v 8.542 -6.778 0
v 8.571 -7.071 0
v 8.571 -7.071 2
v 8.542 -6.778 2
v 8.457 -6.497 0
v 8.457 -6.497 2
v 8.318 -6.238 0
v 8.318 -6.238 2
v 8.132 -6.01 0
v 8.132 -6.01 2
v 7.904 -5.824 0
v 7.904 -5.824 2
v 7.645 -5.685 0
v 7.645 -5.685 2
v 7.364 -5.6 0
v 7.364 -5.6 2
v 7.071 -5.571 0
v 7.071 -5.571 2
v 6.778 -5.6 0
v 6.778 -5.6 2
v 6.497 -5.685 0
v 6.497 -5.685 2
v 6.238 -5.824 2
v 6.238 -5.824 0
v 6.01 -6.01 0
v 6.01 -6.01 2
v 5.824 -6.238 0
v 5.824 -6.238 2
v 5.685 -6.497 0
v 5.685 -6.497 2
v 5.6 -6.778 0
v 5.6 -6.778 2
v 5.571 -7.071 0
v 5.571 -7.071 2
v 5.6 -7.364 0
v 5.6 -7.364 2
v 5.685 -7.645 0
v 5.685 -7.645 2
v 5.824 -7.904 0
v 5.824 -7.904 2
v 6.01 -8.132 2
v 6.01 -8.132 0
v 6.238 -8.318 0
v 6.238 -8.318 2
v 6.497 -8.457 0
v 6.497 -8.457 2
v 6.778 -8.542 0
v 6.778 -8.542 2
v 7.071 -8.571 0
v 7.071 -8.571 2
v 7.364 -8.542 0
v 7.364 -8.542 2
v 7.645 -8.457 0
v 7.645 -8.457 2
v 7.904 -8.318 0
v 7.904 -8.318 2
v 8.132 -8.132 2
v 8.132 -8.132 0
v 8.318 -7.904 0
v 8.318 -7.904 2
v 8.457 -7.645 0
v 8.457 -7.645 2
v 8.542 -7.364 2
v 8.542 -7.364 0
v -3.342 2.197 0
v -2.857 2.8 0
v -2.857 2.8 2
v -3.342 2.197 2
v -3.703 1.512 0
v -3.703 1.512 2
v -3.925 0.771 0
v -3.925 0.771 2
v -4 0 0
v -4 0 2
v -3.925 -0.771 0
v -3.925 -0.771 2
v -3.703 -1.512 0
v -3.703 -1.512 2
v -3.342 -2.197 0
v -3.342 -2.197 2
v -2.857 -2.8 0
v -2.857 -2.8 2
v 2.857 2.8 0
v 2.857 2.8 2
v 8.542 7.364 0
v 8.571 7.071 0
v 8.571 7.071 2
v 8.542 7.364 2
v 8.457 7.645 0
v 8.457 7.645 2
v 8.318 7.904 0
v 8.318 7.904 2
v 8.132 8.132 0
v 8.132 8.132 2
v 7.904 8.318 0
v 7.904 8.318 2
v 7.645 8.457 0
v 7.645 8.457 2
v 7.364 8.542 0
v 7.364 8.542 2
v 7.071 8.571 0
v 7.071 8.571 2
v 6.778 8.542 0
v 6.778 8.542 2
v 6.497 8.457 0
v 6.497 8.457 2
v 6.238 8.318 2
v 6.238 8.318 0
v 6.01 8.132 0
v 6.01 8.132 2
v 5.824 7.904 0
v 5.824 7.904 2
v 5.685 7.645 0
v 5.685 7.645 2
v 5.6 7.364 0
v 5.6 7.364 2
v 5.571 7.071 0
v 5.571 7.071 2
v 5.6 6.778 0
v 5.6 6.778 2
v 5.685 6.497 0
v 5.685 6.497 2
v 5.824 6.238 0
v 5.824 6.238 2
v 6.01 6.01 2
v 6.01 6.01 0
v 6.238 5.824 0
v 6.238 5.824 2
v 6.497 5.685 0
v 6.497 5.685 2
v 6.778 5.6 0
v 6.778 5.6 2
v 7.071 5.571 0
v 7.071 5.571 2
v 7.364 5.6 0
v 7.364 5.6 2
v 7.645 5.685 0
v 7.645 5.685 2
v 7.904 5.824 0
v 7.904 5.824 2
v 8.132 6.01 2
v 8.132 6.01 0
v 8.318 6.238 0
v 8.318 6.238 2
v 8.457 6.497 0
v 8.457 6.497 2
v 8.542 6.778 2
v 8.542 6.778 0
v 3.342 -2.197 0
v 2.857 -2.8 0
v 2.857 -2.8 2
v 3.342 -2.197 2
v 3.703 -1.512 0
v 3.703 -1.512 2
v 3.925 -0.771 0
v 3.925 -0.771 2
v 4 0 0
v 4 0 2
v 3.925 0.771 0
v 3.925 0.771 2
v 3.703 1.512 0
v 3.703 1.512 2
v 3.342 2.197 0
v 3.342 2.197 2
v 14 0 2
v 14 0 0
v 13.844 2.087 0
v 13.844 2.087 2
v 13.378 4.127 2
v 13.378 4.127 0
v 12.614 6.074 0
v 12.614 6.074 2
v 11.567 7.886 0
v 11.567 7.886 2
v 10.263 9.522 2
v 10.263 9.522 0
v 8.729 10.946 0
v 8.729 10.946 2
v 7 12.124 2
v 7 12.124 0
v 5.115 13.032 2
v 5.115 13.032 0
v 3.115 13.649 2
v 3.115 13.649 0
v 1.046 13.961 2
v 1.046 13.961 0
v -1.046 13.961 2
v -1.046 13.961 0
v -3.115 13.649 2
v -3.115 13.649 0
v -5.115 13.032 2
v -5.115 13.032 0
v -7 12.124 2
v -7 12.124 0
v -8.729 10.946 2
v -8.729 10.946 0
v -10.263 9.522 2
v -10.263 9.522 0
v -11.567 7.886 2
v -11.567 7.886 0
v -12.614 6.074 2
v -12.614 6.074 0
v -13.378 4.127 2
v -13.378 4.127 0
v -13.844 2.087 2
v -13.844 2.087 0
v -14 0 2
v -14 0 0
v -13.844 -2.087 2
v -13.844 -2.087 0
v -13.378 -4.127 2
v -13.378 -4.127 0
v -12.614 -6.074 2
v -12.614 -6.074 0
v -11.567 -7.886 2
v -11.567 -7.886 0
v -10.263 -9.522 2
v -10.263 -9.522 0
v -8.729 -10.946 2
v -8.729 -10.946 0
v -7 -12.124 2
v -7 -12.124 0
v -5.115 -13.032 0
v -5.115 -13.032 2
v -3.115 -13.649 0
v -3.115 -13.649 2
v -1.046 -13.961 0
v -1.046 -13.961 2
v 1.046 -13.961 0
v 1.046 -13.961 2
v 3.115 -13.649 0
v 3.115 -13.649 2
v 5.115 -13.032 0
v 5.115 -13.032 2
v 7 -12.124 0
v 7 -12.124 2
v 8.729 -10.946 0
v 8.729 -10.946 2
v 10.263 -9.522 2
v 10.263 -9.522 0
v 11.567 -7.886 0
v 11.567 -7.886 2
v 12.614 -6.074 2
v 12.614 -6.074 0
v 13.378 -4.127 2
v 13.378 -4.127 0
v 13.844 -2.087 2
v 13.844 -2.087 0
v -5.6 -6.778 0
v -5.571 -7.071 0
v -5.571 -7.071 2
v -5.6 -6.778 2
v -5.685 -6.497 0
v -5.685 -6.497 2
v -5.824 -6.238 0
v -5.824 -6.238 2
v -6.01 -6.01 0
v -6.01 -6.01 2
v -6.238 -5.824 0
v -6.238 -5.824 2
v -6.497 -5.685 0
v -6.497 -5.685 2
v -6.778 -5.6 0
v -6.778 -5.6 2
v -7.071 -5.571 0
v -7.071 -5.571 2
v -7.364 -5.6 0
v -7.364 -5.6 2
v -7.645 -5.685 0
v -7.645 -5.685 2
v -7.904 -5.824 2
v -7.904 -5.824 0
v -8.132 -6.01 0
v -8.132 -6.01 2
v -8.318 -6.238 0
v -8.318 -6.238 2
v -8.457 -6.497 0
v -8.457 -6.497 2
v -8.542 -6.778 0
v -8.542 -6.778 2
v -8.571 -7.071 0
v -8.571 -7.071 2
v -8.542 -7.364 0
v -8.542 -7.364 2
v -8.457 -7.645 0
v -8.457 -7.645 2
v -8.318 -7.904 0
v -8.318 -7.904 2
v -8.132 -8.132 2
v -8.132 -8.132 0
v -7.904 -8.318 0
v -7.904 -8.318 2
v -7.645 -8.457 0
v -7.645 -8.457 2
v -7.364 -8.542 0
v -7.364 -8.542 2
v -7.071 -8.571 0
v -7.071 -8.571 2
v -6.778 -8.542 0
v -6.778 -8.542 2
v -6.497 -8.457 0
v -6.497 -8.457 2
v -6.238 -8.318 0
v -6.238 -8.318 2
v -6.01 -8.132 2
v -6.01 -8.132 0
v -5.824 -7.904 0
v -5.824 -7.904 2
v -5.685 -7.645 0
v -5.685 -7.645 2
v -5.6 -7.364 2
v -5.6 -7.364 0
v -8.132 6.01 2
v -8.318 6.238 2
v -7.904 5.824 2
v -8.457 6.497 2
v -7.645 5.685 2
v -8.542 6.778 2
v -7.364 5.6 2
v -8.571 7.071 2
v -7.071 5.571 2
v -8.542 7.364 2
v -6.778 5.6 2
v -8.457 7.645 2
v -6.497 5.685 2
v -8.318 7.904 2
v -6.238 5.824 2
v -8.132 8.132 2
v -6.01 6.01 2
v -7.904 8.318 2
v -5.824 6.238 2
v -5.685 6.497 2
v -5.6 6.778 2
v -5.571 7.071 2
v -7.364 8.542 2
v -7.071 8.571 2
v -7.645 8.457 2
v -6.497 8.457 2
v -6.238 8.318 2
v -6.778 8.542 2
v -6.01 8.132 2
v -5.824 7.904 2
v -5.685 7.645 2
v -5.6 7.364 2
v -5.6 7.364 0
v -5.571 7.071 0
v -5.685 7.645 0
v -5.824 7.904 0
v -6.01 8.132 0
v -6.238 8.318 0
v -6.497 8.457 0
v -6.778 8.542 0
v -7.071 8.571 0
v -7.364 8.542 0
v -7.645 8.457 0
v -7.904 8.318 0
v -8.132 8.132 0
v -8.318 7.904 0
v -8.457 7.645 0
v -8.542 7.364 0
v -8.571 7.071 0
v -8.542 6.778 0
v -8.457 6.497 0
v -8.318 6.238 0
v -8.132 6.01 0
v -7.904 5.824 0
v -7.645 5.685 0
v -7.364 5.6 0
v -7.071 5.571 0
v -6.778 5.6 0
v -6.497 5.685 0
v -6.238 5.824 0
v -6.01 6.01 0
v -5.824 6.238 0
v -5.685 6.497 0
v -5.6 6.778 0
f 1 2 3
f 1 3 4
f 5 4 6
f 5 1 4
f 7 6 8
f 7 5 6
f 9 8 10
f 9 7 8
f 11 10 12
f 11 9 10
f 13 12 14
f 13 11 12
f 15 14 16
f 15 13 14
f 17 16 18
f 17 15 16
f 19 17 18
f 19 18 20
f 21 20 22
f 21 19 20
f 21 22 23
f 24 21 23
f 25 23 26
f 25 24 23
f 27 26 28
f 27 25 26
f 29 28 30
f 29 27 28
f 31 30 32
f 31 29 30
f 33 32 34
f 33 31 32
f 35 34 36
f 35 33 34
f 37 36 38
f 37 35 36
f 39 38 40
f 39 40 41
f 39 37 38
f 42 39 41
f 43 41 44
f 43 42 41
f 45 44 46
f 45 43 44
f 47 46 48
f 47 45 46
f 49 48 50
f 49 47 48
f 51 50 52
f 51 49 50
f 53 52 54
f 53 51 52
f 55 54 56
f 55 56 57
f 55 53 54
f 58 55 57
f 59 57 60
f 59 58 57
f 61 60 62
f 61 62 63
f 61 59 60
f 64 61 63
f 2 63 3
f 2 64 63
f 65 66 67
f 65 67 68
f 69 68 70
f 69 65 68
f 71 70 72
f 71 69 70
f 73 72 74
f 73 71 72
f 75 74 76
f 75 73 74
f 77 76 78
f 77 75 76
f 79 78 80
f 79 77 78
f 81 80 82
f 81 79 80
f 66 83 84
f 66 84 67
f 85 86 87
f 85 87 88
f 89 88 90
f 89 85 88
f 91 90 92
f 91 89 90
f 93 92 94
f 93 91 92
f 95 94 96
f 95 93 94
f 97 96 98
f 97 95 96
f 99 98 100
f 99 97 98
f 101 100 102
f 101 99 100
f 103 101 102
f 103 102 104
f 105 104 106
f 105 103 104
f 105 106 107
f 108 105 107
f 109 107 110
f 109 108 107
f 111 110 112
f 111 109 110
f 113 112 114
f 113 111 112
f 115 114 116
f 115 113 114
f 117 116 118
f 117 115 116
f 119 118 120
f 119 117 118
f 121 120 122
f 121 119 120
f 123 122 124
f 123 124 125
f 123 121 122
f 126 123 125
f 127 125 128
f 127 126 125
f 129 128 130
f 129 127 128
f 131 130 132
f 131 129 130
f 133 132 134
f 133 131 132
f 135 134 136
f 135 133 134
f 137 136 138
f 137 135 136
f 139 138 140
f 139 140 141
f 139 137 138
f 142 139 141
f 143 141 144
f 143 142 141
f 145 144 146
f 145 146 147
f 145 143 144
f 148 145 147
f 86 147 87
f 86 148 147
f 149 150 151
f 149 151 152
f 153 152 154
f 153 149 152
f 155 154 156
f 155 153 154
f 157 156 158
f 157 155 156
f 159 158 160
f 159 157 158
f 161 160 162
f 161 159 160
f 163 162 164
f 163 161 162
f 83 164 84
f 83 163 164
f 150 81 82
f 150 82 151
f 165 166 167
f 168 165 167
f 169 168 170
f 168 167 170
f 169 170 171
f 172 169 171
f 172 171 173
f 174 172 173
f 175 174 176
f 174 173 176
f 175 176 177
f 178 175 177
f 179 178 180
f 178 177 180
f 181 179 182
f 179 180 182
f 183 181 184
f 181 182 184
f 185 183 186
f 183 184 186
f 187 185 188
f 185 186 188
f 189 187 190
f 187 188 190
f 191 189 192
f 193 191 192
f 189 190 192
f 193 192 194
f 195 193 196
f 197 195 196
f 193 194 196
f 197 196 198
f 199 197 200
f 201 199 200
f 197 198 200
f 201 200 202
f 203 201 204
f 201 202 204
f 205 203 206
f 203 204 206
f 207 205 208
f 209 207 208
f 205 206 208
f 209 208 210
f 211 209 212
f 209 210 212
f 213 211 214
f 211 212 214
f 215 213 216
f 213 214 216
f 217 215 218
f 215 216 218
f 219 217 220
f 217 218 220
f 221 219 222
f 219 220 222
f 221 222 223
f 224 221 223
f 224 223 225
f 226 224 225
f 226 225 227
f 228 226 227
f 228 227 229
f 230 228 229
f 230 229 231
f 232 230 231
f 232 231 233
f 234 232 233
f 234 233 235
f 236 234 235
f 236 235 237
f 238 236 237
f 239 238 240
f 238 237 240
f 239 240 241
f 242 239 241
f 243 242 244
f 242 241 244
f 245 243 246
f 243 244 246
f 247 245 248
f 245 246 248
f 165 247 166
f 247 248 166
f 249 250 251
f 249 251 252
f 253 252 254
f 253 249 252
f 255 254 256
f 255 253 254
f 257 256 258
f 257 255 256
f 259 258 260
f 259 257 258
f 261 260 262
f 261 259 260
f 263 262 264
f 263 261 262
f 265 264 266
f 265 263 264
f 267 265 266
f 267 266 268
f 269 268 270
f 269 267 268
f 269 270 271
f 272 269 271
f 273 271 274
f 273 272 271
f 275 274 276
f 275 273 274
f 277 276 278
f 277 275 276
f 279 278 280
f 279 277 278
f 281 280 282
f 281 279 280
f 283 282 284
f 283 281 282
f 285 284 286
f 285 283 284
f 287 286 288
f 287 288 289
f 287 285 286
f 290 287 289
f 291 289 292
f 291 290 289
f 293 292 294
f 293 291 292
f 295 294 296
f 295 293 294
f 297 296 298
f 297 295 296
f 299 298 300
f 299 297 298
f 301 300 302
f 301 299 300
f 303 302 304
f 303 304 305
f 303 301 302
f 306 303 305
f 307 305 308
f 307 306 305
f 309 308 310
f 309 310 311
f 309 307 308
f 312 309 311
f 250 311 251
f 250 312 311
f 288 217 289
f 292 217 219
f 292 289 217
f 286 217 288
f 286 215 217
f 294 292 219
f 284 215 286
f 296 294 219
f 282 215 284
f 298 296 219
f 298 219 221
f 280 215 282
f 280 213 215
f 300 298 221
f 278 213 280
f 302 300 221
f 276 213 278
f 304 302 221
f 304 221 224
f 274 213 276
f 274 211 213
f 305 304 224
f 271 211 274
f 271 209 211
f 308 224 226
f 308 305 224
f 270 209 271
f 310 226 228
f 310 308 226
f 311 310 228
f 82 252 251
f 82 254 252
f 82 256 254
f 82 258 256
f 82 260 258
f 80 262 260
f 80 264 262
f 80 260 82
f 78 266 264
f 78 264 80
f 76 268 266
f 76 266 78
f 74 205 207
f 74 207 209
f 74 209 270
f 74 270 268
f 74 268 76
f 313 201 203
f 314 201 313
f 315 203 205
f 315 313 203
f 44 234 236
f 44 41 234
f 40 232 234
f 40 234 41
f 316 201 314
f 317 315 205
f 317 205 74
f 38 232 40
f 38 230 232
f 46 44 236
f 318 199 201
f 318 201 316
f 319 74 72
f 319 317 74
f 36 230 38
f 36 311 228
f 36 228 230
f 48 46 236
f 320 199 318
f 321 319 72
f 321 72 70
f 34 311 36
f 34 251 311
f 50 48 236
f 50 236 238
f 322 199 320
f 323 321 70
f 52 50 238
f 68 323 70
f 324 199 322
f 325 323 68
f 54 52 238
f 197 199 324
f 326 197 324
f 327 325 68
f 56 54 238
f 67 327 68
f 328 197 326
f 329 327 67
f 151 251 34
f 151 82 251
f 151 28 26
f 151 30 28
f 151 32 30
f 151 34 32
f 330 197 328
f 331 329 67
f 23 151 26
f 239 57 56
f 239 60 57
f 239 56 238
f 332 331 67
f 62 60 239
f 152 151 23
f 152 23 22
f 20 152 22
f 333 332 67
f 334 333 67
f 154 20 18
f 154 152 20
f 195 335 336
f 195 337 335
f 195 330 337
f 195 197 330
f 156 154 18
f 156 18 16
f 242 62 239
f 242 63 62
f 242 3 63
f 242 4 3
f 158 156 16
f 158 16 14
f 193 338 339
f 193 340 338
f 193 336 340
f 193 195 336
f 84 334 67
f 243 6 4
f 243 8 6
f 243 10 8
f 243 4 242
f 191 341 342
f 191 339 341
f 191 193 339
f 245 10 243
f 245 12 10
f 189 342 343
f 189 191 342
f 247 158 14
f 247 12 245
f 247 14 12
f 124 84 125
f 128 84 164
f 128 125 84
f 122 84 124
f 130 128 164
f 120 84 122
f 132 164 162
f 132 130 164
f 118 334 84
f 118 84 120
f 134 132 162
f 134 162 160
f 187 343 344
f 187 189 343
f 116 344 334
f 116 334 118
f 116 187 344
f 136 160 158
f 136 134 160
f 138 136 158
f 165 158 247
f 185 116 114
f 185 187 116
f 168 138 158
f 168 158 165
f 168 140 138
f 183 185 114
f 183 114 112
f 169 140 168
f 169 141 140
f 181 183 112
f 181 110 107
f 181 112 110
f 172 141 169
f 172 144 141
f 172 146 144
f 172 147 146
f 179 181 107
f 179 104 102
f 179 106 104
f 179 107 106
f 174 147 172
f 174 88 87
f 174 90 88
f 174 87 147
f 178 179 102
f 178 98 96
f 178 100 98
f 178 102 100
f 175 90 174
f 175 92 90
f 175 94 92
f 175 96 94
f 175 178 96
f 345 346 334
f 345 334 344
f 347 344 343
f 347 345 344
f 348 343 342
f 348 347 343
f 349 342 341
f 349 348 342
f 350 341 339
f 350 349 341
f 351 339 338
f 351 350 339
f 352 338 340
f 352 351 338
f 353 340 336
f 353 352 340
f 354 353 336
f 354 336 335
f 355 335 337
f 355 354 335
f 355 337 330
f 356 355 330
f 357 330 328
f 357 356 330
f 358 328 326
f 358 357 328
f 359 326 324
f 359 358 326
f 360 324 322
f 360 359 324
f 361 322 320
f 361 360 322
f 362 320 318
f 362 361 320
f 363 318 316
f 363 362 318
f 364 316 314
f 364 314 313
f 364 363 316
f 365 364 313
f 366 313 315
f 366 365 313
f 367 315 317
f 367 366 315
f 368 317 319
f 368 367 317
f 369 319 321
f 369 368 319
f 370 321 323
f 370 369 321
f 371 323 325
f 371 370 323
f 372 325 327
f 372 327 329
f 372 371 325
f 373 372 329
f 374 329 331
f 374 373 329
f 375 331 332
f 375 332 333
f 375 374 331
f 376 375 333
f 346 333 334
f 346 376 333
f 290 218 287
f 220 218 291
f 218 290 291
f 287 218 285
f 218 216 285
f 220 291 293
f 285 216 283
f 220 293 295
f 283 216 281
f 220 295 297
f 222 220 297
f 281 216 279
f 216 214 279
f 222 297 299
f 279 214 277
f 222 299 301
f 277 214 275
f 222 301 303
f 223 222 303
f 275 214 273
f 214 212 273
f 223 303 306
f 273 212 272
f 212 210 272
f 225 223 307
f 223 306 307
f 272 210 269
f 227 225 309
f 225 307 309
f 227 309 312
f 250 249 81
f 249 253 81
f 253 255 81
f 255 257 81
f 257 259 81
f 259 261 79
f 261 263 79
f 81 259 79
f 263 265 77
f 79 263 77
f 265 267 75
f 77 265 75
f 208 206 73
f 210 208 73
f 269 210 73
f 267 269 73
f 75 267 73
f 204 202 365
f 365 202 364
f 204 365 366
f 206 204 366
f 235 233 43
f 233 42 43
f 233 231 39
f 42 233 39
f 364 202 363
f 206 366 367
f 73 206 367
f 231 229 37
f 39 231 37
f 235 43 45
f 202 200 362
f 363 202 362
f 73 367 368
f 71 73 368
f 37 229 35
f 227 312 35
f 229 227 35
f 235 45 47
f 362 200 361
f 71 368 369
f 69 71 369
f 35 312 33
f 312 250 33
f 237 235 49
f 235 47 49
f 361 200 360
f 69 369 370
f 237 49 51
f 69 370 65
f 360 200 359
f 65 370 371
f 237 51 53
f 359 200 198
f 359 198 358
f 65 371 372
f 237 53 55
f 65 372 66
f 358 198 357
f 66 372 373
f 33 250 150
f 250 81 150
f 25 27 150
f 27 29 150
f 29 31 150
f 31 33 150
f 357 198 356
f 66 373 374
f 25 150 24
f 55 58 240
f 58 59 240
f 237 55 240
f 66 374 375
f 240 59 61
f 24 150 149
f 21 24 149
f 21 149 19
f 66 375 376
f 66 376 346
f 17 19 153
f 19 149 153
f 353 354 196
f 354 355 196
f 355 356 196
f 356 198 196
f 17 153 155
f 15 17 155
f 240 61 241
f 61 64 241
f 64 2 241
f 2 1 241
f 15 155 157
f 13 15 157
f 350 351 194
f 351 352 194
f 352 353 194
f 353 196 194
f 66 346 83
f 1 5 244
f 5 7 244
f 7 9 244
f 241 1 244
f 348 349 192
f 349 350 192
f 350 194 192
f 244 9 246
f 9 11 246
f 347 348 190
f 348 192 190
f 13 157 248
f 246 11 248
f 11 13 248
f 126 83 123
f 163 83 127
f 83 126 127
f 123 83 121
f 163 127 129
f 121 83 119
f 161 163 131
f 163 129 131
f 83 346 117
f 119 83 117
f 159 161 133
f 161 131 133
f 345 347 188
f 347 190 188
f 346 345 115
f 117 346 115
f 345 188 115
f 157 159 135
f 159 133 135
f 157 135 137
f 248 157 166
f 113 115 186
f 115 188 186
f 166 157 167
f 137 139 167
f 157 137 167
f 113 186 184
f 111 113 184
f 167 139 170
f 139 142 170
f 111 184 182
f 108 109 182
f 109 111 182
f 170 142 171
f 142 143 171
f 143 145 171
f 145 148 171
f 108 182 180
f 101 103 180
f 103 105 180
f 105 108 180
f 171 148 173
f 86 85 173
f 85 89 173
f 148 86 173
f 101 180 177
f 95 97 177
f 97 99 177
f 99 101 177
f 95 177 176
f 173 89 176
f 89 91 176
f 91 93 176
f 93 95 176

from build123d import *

# Parameters (mm, degrees)
SKETCH_1_R          = 14
SKETCH_1_R_2        = 1.5
EXTRUDE_1_DEPTH     = 2
CUT_EXTRUDE_1_DEPTH = 20.899748742


with BuildPart() as part:
    # 草图1 → 凸台-拉伸1 (new body)
    with BuildSketch(Plane.XY):
        Circle(SKETCH_1_R)
        with Locations((-7.071067812, 7.071067812)):
            Circle(SKETCH_1_R_2, mode=Mode.SUBTRACT)
        with Locations((7.071067812, 7.071067812)):
            Circle(SKETCH_1_R_2, mode=Mode.SUBTRACT)
        with Locations((-7.071067812, -7.071067812)):
            Circle(SKETCH_1_R_2, mode=Mode.SUBTRACT)
        with Locations((7.071067812, -7.071067812)):
            Circle(SKETCH_1_R_2, mode=Mode.SUBTRACT)
    extrude(amount=EXTRUDE_1_DEPTH)

    # 草图2 → 切除-拉伸1 (cut, through all)
    with BuildSketch(Plane(origin=(0, 0, 0), x_dir=(-1, 0, 0), z_dir=(0, 0, -1))):
        with BuildLine():
            Line((-2.856571371, 2.8), (2.856571371, 2.8))
            ThreePointArc((2.856571371, 2.8), (4, 0), (2.856571371, -2.8))
            Line((2.856571371, -2.8), (-2.856571371, -2.8))
            ThreePointArc((-2.856571371, -2.8), (-4, 0), (-2.856571371, 2.8))
        make_face()
    extrude(amount=-CUT_EXTRUDE_1_DEPTH, mode=Mode.SUBTRACT)


solid = part.part
